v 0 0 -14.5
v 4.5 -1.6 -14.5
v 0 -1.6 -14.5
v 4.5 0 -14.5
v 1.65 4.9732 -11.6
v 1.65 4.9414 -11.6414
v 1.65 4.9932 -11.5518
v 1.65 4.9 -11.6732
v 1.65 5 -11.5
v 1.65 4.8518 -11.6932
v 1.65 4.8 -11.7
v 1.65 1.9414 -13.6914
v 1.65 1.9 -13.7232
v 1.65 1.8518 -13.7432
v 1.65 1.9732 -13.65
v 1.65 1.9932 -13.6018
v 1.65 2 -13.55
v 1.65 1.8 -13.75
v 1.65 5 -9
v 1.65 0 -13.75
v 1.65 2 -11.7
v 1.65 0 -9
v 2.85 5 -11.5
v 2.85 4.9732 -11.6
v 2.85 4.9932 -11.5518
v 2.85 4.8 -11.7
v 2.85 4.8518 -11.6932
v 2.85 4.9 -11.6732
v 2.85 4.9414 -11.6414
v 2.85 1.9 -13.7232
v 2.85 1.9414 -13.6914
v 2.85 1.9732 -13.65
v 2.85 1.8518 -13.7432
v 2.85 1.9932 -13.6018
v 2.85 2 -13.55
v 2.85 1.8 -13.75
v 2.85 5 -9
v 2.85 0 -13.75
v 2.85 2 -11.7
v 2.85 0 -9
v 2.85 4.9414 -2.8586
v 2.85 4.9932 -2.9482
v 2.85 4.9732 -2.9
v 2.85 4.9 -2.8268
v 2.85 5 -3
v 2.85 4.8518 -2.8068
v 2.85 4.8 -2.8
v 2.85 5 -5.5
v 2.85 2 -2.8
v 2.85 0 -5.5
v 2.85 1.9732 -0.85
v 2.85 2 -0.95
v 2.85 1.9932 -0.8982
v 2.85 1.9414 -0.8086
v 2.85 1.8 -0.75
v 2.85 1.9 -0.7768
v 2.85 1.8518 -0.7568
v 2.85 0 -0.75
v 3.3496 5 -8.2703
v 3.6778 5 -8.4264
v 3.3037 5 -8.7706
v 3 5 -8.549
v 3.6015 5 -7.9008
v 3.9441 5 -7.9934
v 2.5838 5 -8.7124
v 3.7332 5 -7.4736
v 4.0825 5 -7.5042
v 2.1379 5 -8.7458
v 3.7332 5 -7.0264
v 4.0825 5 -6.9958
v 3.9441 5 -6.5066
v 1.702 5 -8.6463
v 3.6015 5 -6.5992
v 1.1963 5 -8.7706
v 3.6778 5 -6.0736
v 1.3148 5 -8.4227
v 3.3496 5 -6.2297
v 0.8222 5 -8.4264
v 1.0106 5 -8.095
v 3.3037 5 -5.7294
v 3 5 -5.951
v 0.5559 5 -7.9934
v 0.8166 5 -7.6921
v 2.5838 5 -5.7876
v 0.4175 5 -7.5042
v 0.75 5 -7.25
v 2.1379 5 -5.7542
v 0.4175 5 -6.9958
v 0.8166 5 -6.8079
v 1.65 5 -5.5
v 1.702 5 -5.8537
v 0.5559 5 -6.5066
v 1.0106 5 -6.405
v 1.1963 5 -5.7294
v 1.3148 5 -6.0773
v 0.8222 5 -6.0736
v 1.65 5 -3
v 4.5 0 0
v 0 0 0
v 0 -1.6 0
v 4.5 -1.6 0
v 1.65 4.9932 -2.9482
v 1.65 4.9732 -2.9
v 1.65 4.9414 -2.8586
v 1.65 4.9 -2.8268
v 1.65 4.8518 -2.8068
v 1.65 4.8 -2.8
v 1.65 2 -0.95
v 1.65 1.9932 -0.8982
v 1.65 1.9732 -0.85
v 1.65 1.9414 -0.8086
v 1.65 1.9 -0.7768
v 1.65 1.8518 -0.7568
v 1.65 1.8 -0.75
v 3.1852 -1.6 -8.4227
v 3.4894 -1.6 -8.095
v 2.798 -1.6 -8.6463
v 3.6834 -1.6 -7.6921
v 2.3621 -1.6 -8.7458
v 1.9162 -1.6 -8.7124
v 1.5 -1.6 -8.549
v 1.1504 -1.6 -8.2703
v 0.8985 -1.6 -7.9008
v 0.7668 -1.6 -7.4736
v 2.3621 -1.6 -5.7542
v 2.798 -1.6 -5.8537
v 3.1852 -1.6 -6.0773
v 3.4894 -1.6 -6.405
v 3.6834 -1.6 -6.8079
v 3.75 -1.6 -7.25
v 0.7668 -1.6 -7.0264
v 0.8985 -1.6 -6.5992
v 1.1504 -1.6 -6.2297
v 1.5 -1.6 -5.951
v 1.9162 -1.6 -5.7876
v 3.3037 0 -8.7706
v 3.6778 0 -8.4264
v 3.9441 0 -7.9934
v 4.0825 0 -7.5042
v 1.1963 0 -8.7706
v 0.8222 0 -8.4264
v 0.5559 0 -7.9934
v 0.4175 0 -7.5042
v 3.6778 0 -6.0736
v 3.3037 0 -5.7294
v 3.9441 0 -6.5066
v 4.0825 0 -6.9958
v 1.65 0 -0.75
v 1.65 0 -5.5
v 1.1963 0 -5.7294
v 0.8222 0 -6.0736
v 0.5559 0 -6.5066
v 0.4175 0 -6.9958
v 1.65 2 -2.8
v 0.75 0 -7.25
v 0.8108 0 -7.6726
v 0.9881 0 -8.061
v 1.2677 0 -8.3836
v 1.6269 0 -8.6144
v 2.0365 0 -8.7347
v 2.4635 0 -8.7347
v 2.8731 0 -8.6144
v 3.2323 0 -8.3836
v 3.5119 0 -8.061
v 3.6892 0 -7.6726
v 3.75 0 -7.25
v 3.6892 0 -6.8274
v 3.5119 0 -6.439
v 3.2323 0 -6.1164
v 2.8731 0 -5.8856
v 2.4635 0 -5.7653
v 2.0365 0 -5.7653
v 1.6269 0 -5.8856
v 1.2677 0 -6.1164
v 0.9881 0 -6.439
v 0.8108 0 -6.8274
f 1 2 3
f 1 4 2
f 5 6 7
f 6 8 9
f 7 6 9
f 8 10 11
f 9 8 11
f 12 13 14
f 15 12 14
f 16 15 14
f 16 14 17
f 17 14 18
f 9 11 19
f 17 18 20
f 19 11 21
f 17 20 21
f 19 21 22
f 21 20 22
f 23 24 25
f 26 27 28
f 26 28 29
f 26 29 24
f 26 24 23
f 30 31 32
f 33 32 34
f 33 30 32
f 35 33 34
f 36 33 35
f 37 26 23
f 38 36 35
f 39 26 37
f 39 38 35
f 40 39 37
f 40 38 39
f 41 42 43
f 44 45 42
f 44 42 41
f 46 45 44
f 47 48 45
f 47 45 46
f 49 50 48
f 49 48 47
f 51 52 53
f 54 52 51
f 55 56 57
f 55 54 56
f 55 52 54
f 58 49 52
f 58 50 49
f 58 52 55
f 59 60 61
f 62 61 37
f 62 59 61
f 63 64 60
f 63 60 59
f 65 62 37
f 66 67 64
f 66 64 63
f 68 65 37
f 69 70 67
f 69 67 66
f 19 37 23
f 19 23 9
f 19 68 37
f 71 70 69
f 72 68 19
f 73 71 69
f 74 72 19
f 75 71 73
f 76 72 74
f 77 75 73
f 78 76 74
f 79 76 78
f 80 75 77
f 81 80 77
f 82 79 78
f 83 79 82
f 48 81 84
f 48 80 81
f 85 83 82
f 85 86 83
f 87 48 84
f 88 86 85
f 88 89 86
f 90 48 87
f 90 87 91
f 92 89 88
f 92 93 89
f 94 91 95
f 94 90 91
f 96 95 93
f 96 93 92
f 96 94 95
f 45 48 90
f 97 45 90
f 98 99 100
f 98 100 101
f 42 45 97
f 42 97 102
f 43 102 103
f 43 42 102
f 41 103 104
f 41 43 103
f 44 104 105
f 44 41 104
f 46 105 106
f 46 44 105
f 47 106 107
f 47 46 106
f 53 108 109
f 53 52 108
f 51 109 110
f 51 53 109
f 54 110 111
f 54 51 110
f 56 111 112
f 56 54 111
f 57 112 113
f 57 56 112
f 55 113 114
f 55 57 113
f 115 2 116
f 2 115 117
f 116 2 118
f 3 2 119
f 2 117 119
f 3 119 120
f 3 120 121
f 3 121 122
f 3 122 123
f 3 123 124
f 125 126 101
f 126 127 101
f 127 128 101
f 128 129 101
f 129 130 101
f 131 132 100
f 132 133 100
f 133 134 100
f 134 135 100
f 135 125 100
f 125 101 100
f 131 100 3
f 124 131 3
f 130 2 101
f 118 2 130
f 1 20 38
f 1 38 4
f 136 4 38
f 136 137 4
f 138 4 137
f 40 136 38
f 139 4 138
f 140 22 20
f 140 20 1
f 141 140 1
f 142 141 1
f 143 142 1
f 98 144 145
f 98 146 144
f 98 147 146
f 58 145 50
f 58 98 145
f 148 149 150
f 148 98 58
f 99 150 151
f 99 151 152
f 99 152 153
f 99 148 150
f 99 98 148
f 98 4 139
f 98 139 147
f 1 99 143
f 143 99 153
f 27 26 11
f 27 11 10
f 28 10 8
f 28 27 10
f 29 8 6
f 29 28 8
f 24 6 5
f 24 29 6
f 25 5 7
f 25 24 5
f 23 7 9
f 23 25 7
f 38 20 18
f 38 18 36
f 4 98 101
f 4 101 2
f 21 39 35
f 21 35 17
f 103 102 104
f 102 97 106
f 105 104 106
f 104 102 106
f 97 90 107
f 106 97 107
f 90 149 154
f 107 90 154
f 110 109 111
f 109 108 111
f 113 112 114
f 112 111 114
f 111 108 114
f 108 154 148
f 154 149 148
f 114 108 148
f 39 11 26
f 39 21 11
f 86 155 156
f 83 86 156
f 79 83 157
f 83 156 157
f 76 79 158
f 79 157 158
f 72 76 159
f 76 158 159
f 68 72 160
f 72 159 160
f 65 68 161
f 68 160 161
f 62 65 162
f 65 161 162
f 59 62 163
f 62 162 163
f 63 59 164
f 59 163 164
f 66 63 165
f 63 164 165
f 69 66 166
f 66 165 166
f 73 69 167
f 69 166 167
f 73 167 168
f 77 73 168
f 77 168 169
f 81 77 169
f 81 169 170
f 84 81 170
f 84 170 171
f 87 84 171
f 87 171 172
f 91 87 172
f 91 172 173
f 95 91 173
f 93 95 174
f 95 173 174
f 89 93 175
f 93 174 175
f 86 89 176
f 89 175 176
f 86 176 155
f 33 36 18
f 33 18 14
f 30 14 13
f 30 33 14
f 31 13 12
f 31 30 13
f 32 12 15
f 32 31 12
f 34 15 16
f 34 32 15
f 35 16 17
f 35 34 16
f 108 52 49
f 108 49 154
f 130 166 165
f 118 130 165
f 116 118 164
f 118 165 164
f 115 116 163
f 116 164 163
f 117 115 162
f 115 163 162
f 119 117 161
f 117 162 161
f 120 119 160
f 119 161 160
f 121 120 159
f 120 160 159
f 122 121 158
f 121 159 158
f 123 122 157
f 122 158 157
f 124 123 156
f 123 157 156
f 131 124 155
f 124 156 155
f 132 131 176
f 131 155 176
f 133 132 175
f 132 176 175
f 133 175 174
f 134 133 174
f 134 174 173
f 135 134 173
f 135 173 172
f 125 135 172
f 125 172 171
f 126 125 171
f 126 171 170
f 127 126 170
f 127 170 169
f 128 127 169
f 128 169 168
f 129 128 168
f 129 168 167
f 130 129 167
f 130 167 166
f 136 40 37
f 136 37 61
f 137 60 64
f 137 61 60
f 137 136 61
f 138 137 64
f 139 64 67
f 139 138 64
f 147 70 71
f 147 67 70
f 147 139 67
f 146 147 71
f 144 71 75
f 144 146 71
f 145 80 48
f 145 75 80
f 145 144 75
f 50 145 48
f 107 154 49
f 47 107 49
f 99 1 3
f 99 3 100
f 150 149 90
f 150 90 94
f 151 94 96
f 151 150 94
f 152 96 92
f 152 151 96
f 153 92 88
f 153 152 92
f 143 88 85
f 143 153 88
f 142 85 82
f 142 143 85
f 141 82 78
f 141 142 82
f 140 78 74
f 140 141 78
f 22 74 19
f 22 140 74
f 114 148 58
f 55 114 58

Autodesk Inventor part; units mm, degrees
ref_plane "YZ Plane" through (0, 0, 0) normal (1, 0, 0) x (0, 1, 0)
ref_plane "XZ Plane" through (0, 0, 0) normal (0, 1, 0) x (-1, 0, 0)
ref_plane "XY Plane" through (0, 0, 0) normal (0, 0, 1) x (1, 0, 0)
sketch "Sketch1" plane through (0, 0, 0) normal (0, 1, 0) x (-1, 0, 0)
  line L0 (0, 0) -> (-4.5, 0)
  line L1 (-4.5, 0) -> (-4.5, -14.5)
  line L2 (-4.5, -14.5) -> (0, -14.5)
  line L3 (0, -14.5) -> (0, 0)
  circle A0 centre (-2.25, -7.25) radius 1.5
  line L4 (-1.65, -13.75) -> (-1.65, -9)
  line L5 (-1.65, -5.5) -> (-1.65, -0.75)
  line L6 (-2.85, -13.75) -> (-2.85, -9)
  line L7 (-2.85, -5.5) -> (-2.85, -0.75)
  line L8 (-1.65, -0.75) -> (-2.85, -0.75)
  line L9 (-1.65, -13.75) -> (-2.85, -13.75)
  line L10 (-1.65, -11.7) -> (-2.85, -11.7)
  line L11 (-1.65, -2.8) -> (-2.85, -2.8)
  circle A1 centre (-2.25, -7.25) radius 1.85
  dimension "d0" = 4.5
  dimension "d2" = 3
  dimension "d9" = 3.7
  dimension "d32" = 7.25
  dimension "d33" = 7.25
extrude "Extrusion1" add sketch "Sketch1" against normal blind 1.6 contours L3 L2 L1 L0 | A0 | L9 L6 L10 L4 | L10 L6 A1 L4 | A1 | L7 L11 L5 A1 | L7 L8 L5 L11
extrude "Extrusion2" add sketch "Sketch1" along normal blind 2 contours L9 L6 L10 L4 | L7 L8 L5 L11
extrude "Extrusion3" add sketch "Sketch1" along normal blind 5 contours L10 L6 A1 L4 | A1 | L7 L11 L5 A1
fillet "Fillet1" radius 0.2 4 edges at (2.25, 5, -2.8) (2.25, 5, -11.7) (2.25, 2, -0.75) (2.25, 2, -13.75)
thread "Thread1" size "M3x0.35" class "6H" standard "ANSI Metric M Profile" length 8.5
sketch "Sketch2" plane through (2.25, 0, -7.25) normal (0, 1, 0) x (1, 0, 0)
  circle A0 centre (0, 0) radius 1.5 projected
  point P0 (-2.25, -7.25)
extrude "Extrusion4" cut sketch "Sketch2" against normal blind 10
properties part number "fixação do pino" material "Aluminum 6061-AHC"
